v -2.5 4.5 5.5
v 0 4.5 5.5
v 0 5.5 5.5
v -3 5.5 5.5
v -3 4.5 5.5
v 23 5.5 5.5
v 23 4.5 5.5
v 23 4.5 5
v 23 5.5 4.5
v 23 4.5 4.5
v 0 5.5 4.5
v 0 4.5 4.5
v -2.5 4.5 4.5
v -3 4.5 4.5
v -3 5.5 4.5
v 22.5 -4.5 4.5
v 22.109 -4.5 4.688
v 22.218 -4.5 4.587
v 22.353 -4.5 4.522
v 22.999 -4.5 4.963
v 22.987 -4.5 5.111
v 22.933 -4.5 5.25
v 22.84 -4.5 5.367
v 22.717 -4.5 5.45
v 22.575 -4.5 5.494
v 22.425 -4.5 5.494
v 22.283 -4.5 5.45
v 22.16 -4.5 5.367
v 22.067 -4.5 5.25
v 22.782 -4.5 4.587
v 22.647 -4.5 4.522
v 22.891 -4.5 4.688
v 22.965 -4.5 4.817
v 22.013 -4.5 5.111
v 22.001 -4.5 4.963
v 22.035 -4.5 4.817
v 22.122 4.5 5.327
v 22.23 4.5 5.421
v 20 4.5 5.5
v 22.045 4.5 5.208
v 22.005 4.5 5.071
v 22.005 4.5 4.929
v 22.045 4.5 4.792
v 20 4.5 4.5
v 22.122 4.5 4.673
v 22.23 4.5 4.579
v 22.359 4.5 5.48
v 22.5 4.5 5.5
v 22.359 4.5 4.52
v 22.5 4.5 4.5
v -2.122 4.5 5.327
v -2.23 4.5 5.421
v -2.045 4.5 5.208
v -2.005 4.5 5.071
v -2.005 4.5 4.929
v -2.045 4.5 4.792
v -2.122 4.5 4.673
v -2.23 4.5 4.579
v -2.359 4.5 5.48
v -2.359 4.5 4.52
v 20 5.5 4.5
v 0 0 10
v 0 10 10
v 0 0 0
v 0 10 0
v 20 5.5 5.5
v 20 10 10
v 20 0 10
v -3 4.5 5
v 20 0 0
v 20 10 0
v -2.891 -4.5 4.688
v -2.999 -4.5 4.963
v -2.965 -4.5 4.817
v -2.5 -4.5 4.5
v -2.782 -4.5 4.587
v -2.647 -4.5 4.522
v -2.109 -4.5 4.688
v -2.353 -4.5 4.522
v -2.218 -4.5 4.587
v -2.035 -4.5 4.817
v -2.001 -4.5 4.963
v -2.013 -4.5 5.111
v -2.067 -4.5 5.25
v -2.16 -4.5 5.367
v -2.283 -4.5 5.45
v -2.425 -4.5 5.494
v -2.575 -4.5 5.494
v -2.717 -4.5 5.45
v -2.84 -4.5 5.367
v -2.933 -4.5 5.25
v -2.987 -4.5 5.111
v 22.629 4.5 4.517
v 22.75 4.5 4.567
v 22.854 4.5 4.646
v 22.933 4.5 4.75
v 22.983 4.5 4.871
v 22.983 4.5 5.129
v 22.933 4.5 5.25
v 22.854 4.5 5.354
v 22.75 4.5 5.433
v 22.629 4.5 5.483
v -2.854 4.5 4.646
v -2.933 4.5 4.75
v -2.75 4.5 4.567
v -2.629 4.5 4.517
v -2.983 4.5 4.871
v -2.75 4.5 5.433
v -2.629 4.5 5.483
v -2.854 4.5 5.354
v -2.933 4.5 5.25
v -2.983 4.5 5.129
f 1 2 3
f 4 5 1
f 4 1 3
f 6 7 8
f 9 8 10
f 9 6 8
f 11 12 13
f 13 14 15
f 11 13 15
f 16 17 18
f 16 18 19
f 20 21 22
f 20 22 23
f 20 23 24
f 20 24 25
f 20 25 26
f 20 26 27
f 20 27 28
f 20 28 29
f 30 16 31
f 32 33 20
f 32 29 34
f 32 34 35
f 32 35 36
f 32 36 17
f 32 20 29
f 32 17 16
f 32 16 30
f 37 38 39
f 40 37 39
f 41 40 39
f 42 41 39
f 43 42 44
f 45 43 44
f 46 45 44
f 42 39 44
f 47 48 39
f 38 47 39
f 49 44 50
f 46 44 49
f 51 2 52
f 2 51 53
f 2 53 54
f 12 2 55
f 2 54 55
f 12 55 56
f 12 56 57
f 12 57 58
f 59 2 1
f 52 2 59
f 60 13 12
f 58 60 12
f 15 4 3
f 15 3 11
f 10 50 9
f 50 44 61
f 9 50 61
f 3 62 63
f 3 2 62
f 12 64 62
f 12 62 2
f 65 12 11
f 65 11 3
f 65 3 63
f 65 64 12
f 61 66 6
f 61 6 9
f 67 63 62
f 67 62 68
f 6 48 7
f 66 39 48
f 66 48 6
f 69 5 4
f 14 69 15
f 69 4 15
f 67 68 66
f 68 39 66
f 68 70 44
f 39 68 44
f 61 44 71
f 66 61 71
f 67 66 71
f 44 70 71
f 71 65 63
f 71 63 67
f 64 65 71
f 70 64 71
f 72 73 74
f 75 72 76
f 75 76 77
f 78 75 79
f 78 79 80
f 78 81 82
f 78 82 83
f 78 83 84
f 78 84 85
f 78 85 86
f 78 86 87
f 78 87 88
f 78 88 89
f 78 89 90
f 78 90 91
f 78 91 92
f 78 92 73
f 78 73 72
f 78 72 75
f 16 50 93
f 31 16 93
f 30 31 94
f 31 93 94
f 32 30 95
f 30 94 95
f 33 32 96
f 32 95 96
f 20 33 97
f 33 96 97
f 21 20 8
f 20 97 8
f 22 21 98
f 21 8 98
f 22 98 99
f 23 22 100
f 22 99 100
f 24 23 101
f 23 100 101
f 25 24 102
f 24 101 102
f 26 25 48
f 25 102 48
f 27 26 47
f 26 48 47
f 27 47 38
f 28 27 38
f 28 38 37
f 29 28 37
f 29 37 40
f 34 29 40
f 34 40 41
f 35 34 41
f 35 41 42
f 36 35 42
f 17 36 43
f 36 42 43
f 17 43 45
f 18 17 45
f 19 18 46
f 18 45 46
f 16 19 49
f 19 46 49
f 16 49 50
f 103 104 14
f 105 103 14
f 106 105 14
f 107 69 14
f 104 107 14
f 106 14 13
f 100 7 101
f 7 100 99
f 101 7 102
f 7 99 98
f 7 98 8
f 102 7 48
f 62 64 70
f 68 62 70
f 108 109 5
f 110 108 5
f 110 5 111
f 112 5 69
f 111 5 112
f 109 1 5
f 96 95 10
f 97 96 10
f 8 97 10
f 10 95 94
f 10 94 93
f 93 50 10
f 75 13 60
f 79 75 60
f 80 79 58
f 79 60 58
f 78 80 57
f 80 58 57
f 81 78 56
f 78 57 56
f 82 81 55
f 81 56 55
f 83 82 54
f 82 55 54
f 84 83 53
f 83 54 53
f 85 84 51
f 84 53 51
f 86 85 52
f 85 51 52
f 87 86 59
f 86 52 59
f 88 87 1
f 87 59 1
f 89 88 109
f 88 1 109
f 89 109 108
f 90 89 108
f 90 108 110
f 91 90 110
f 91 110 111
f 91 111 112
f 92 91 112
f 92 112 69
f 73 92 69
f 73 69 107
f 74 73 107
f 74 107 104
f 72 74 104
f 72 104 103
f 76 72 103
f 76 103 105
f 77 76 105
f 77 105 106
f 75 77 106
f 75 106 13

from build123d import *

# Parameters (mm, degrees)
SKETCH_1_W           = 20
SKETCH_1_H           = 10
EXTRUDE_1_DEPTH      = 10
EXTRUDE_2_DEPTH      = 3
EXTRUDE_2_DEPTH_BACK = 23
SKETCH_2_W           = 1
SKETCH_2_H           = 1
SKETCH_3_R           = 0.5
EXTRUDE_3_DEPTH      = 9


with BuildPart() as part:
    # Эскиз1 → Вытянуть1 (new body)
    with BuildSketch(Plane.XY):
        with Locations((10, 5)):
            Rectangle(SKETCH_1_W, SKETCH_1_H)
    extrude(amount=EXTRUDE_1_DEPTH)

    # Эскиз2 → Вытянуть2 (add, two sides: drawn at the far end of the back side and taken through both)
    with BuildSketch(Plane(origin=(20, 0, 0), x_dir=(0, 0, -1), z_dir=(1, 0, 0)).offset(-EXTRUDE_2_DEPTH_BACK)):
        with Locations((-5, 5)):
            Rectangle(SKETCH_2_W, SKETCH_2_H)
    extrude(amount=EXTRUDE_2_DEPTH + EXTRUDE_2_DEPTH_BACK)

    # Эскиз3 → Вытянуть3 (add)
    with BuildSketch(Plane.XZ.offset(-4.5)):
        with Locations((-2.5, 5)):
            Circle(SKETCH_3_R)
        with Locations((22.5, 5)):
            Circle(SKETCH_3_R)
    extrude(amount=EXTRUDE_3_DEPTH)


solid = part.part
